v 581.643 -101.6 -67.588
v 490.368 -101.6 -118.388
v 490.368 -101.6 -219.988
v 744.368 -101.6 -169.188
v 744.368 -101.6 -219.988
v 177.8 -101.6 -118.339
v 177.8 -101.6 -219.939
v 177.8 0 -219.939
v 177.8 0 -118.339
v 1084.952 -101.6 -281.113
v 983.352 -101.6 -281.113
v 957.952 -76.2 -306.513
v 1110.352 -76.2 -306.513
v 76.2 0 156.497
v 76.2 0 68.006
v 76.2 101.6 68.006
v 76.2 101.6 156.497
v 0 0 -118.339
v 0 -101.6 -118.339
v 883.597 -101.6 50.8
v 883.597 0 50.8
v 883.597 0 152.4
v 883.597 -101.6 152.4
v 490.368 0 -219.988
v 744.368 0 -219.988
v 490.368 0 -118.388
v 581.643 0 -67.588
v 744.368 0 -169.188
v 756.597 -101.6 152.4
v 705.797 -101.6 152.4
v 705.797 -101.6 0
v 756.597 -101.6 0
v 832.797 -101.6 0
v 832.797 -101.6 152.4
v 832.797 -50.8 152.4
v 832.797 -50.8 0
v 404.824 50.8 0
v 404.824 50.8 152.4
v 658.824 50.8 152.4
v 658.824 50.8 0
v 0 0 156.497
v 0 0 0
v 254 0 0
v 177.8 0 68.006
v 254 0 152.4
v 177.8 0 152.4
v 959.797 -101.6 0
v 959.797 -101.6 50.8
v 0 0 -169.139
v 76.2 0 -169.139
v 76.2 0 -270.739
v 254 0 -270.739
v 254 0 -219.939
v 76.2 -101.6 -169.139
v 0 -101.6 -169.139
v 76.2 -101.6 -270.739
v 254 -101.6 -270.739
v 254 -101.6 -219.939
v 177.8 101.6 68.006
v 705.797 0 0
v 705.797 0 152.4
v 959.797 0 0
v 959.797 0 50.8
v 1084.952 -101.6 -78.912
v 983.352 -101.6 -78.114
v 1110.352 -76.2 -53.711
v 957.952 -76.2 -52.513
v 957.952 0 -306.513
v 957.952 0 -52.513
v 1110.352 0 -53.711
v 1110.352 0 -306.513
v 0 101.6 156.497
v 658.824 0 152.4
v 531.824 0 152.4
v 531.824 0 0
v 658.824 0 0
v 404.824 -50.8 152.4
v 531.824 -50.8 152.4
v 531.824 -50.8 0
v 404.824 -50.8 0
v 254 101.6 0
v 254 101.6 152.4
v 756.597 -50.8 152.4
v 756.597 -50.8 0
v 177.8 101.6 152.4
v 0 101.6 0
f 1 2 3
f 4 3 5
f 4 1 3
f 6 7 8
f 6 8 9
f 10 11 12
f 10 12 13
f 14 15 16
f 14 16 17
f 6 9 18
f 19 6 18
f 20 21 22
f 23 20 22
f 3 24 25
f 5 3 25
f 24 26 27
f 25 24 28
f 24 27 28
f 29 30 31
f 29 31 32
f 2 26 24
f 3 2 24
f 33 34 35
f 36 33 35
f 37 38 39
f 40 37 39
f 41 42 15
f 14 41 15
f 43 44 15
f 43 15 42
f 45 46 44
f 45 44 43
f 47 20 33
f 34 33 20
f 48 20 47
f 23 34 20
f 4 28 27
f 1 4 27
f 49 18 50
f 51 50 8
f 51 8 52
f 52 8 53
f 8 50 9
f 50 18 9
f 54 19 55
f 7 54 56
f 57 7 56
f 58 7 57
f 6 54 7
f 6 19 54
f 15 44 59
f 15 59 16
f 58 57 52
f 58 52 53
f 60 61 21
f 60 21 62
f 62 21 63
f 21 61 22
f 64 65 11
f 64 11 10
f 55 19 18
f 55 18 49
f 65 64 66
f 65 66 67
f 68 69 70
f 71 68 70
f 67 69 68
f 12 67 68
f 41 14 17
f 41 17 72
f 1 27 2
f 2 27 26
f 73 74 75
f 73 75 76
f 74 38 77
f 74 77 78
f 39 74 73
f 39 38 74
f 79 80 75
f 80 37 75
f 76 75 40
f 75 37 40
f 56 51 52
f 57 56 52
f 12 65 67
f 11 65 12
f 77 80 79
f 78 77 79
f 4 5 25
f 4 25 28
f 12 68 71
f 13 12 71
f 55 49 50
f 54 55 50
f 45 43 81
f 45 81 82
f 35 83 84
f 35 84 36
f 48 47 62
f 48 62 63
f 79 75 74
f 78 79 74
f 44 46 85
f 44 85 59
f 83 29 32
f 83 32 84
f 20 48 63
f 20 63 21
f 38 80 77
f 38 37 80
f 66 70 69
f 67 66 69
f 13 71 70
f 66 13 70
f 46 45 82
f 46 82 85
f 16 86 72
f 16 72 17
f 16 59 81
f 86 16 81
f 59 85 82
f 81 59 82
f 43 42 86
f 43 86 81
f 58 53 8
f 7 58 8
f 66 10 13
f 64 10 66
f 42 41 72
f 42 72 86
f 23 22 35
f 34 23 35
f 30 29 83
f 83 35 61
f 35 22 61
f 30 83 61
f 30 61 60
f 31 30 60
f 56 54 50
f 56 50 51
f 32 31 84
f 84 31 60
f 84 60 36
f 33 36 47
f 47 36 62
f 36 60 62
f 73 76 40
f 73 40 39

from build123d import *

# Parameters (mm, degrees)
F1_DEPTH  = 101.6
F2_W      = 254
F2_H      = 152.4
F3_DEPTH  = 50.8
F4_W      = 127
F4_H      = 152.4
F5_DEPTH  = 50.8
F7_DEPTH  = 101.6
F8_W      = 76.2
F8_H      = 50.8
F9_DEPTH  = 152.4
F11_DEPTH = 101.6
F13_DEPTH = 101.6
F15_DEPTH = 101.6
F16_SIZE  = 25.4


with BuildPart() as f1:
    # F0 (on Front) → F1 (new body)
    with BuildSketch(Plane.XZ):
        Polygon((0, 156.496749), (0, 0), (254, 0), (254, 152.4), (177.8, 152.4), (177.8, 68.006436), (76.2, 68.006436), (76.2, 156.496749), align=None)
    extrude(amount=-F1_DEPTH)


with BuildPart() as f3:
    # F2 (on Front) → F3 (new body)
    with BuildSketch(Plane.XZ):
        with Locations((531.823917, 76.2)):
            Rectangle(F2_W, F2_H)
    extrude(amount=-F3_DEPTH)

    # F4 (on face) → F5 (join)
    with BuildSketch(Plane.XZ):
        with Locations((468.323917, 76.2)):
            Rectangle(F4_W, F4_H)
    extrude(amount=F5_DEPTH)


with BuildPart() as f7:
    # F6 (on Front) → F7 (new body)
    with BuildSketch(Plane.XZ):
        Polygon((705.796528, 152.4), (705.796528, 0), (959.796528, 0), (959.796528, 50.8), (883.596528, 50.8), (883.596528, 152.4), align=None)
    extrude(amount=F7_DEPTH)

    # F8 (on face) → F9 (cut)
    with BuildSketch(Plane.XY.offset(152.4)):
        with Locations((794.696528, -76.2)):
            Rectangle(F8_W, F8_H)
    extrude(amount=-F9_DEPTH, mode=Mode.SUBTRACT)


with BuildPart() as f11:
    # F10 (on Front) → F11 (new body)
    with BuildSketch(Plane.XZ):
        Polygon((177.8, -118.339481), (0, -118.339481), (0, -169.139481), (76.2, -169.139481), (76.2, -270.739481), (254, -270.739481), (254, -219.939481), (177.8, -219.939481), align=None)
    extrude(amount=F11_DEPTH)


with BuildPart() as f13:
    # F12 (on Front) → F13 (new body)
    with BuildSketch(Plane.XZ):
        Polygon((581.643275, -67.588492), (490.36846, -118.388492), (490.36846, -219.988492), (744.36846, -219.988492), (744.36846, -169.188492), align=None)
    extrude(amount=F13_DEPTH)


with BuildPart() as f15:
    # F14 (on Front) → F15 (new body)
    with BuildSketch(Plane.XZ):
        Polygon((1110.351549, -53.711375), (957.951549, -52.513261), (957.951549, -306.513261), (1110.351549, -306.513261), align=None)
    extrude(amount=F15_DEPTH)

    # F16
    f16_edges = [f15.edges().sort_by_distance(p)[0] for p in [
        (1034.151549, -101.6, -53.112318),
        (957.951549, -101.6, -179.513261),
        (1034.151549, -101.6, -306.513261),
        (1110.351549, -101.6, -180.112318),
    ]]
    chamfer(f16_edges, length=F16_SIZE)


solid = Compound([f1.part, f3.part, f7.part, f11.part, f13.part, f15.part])
